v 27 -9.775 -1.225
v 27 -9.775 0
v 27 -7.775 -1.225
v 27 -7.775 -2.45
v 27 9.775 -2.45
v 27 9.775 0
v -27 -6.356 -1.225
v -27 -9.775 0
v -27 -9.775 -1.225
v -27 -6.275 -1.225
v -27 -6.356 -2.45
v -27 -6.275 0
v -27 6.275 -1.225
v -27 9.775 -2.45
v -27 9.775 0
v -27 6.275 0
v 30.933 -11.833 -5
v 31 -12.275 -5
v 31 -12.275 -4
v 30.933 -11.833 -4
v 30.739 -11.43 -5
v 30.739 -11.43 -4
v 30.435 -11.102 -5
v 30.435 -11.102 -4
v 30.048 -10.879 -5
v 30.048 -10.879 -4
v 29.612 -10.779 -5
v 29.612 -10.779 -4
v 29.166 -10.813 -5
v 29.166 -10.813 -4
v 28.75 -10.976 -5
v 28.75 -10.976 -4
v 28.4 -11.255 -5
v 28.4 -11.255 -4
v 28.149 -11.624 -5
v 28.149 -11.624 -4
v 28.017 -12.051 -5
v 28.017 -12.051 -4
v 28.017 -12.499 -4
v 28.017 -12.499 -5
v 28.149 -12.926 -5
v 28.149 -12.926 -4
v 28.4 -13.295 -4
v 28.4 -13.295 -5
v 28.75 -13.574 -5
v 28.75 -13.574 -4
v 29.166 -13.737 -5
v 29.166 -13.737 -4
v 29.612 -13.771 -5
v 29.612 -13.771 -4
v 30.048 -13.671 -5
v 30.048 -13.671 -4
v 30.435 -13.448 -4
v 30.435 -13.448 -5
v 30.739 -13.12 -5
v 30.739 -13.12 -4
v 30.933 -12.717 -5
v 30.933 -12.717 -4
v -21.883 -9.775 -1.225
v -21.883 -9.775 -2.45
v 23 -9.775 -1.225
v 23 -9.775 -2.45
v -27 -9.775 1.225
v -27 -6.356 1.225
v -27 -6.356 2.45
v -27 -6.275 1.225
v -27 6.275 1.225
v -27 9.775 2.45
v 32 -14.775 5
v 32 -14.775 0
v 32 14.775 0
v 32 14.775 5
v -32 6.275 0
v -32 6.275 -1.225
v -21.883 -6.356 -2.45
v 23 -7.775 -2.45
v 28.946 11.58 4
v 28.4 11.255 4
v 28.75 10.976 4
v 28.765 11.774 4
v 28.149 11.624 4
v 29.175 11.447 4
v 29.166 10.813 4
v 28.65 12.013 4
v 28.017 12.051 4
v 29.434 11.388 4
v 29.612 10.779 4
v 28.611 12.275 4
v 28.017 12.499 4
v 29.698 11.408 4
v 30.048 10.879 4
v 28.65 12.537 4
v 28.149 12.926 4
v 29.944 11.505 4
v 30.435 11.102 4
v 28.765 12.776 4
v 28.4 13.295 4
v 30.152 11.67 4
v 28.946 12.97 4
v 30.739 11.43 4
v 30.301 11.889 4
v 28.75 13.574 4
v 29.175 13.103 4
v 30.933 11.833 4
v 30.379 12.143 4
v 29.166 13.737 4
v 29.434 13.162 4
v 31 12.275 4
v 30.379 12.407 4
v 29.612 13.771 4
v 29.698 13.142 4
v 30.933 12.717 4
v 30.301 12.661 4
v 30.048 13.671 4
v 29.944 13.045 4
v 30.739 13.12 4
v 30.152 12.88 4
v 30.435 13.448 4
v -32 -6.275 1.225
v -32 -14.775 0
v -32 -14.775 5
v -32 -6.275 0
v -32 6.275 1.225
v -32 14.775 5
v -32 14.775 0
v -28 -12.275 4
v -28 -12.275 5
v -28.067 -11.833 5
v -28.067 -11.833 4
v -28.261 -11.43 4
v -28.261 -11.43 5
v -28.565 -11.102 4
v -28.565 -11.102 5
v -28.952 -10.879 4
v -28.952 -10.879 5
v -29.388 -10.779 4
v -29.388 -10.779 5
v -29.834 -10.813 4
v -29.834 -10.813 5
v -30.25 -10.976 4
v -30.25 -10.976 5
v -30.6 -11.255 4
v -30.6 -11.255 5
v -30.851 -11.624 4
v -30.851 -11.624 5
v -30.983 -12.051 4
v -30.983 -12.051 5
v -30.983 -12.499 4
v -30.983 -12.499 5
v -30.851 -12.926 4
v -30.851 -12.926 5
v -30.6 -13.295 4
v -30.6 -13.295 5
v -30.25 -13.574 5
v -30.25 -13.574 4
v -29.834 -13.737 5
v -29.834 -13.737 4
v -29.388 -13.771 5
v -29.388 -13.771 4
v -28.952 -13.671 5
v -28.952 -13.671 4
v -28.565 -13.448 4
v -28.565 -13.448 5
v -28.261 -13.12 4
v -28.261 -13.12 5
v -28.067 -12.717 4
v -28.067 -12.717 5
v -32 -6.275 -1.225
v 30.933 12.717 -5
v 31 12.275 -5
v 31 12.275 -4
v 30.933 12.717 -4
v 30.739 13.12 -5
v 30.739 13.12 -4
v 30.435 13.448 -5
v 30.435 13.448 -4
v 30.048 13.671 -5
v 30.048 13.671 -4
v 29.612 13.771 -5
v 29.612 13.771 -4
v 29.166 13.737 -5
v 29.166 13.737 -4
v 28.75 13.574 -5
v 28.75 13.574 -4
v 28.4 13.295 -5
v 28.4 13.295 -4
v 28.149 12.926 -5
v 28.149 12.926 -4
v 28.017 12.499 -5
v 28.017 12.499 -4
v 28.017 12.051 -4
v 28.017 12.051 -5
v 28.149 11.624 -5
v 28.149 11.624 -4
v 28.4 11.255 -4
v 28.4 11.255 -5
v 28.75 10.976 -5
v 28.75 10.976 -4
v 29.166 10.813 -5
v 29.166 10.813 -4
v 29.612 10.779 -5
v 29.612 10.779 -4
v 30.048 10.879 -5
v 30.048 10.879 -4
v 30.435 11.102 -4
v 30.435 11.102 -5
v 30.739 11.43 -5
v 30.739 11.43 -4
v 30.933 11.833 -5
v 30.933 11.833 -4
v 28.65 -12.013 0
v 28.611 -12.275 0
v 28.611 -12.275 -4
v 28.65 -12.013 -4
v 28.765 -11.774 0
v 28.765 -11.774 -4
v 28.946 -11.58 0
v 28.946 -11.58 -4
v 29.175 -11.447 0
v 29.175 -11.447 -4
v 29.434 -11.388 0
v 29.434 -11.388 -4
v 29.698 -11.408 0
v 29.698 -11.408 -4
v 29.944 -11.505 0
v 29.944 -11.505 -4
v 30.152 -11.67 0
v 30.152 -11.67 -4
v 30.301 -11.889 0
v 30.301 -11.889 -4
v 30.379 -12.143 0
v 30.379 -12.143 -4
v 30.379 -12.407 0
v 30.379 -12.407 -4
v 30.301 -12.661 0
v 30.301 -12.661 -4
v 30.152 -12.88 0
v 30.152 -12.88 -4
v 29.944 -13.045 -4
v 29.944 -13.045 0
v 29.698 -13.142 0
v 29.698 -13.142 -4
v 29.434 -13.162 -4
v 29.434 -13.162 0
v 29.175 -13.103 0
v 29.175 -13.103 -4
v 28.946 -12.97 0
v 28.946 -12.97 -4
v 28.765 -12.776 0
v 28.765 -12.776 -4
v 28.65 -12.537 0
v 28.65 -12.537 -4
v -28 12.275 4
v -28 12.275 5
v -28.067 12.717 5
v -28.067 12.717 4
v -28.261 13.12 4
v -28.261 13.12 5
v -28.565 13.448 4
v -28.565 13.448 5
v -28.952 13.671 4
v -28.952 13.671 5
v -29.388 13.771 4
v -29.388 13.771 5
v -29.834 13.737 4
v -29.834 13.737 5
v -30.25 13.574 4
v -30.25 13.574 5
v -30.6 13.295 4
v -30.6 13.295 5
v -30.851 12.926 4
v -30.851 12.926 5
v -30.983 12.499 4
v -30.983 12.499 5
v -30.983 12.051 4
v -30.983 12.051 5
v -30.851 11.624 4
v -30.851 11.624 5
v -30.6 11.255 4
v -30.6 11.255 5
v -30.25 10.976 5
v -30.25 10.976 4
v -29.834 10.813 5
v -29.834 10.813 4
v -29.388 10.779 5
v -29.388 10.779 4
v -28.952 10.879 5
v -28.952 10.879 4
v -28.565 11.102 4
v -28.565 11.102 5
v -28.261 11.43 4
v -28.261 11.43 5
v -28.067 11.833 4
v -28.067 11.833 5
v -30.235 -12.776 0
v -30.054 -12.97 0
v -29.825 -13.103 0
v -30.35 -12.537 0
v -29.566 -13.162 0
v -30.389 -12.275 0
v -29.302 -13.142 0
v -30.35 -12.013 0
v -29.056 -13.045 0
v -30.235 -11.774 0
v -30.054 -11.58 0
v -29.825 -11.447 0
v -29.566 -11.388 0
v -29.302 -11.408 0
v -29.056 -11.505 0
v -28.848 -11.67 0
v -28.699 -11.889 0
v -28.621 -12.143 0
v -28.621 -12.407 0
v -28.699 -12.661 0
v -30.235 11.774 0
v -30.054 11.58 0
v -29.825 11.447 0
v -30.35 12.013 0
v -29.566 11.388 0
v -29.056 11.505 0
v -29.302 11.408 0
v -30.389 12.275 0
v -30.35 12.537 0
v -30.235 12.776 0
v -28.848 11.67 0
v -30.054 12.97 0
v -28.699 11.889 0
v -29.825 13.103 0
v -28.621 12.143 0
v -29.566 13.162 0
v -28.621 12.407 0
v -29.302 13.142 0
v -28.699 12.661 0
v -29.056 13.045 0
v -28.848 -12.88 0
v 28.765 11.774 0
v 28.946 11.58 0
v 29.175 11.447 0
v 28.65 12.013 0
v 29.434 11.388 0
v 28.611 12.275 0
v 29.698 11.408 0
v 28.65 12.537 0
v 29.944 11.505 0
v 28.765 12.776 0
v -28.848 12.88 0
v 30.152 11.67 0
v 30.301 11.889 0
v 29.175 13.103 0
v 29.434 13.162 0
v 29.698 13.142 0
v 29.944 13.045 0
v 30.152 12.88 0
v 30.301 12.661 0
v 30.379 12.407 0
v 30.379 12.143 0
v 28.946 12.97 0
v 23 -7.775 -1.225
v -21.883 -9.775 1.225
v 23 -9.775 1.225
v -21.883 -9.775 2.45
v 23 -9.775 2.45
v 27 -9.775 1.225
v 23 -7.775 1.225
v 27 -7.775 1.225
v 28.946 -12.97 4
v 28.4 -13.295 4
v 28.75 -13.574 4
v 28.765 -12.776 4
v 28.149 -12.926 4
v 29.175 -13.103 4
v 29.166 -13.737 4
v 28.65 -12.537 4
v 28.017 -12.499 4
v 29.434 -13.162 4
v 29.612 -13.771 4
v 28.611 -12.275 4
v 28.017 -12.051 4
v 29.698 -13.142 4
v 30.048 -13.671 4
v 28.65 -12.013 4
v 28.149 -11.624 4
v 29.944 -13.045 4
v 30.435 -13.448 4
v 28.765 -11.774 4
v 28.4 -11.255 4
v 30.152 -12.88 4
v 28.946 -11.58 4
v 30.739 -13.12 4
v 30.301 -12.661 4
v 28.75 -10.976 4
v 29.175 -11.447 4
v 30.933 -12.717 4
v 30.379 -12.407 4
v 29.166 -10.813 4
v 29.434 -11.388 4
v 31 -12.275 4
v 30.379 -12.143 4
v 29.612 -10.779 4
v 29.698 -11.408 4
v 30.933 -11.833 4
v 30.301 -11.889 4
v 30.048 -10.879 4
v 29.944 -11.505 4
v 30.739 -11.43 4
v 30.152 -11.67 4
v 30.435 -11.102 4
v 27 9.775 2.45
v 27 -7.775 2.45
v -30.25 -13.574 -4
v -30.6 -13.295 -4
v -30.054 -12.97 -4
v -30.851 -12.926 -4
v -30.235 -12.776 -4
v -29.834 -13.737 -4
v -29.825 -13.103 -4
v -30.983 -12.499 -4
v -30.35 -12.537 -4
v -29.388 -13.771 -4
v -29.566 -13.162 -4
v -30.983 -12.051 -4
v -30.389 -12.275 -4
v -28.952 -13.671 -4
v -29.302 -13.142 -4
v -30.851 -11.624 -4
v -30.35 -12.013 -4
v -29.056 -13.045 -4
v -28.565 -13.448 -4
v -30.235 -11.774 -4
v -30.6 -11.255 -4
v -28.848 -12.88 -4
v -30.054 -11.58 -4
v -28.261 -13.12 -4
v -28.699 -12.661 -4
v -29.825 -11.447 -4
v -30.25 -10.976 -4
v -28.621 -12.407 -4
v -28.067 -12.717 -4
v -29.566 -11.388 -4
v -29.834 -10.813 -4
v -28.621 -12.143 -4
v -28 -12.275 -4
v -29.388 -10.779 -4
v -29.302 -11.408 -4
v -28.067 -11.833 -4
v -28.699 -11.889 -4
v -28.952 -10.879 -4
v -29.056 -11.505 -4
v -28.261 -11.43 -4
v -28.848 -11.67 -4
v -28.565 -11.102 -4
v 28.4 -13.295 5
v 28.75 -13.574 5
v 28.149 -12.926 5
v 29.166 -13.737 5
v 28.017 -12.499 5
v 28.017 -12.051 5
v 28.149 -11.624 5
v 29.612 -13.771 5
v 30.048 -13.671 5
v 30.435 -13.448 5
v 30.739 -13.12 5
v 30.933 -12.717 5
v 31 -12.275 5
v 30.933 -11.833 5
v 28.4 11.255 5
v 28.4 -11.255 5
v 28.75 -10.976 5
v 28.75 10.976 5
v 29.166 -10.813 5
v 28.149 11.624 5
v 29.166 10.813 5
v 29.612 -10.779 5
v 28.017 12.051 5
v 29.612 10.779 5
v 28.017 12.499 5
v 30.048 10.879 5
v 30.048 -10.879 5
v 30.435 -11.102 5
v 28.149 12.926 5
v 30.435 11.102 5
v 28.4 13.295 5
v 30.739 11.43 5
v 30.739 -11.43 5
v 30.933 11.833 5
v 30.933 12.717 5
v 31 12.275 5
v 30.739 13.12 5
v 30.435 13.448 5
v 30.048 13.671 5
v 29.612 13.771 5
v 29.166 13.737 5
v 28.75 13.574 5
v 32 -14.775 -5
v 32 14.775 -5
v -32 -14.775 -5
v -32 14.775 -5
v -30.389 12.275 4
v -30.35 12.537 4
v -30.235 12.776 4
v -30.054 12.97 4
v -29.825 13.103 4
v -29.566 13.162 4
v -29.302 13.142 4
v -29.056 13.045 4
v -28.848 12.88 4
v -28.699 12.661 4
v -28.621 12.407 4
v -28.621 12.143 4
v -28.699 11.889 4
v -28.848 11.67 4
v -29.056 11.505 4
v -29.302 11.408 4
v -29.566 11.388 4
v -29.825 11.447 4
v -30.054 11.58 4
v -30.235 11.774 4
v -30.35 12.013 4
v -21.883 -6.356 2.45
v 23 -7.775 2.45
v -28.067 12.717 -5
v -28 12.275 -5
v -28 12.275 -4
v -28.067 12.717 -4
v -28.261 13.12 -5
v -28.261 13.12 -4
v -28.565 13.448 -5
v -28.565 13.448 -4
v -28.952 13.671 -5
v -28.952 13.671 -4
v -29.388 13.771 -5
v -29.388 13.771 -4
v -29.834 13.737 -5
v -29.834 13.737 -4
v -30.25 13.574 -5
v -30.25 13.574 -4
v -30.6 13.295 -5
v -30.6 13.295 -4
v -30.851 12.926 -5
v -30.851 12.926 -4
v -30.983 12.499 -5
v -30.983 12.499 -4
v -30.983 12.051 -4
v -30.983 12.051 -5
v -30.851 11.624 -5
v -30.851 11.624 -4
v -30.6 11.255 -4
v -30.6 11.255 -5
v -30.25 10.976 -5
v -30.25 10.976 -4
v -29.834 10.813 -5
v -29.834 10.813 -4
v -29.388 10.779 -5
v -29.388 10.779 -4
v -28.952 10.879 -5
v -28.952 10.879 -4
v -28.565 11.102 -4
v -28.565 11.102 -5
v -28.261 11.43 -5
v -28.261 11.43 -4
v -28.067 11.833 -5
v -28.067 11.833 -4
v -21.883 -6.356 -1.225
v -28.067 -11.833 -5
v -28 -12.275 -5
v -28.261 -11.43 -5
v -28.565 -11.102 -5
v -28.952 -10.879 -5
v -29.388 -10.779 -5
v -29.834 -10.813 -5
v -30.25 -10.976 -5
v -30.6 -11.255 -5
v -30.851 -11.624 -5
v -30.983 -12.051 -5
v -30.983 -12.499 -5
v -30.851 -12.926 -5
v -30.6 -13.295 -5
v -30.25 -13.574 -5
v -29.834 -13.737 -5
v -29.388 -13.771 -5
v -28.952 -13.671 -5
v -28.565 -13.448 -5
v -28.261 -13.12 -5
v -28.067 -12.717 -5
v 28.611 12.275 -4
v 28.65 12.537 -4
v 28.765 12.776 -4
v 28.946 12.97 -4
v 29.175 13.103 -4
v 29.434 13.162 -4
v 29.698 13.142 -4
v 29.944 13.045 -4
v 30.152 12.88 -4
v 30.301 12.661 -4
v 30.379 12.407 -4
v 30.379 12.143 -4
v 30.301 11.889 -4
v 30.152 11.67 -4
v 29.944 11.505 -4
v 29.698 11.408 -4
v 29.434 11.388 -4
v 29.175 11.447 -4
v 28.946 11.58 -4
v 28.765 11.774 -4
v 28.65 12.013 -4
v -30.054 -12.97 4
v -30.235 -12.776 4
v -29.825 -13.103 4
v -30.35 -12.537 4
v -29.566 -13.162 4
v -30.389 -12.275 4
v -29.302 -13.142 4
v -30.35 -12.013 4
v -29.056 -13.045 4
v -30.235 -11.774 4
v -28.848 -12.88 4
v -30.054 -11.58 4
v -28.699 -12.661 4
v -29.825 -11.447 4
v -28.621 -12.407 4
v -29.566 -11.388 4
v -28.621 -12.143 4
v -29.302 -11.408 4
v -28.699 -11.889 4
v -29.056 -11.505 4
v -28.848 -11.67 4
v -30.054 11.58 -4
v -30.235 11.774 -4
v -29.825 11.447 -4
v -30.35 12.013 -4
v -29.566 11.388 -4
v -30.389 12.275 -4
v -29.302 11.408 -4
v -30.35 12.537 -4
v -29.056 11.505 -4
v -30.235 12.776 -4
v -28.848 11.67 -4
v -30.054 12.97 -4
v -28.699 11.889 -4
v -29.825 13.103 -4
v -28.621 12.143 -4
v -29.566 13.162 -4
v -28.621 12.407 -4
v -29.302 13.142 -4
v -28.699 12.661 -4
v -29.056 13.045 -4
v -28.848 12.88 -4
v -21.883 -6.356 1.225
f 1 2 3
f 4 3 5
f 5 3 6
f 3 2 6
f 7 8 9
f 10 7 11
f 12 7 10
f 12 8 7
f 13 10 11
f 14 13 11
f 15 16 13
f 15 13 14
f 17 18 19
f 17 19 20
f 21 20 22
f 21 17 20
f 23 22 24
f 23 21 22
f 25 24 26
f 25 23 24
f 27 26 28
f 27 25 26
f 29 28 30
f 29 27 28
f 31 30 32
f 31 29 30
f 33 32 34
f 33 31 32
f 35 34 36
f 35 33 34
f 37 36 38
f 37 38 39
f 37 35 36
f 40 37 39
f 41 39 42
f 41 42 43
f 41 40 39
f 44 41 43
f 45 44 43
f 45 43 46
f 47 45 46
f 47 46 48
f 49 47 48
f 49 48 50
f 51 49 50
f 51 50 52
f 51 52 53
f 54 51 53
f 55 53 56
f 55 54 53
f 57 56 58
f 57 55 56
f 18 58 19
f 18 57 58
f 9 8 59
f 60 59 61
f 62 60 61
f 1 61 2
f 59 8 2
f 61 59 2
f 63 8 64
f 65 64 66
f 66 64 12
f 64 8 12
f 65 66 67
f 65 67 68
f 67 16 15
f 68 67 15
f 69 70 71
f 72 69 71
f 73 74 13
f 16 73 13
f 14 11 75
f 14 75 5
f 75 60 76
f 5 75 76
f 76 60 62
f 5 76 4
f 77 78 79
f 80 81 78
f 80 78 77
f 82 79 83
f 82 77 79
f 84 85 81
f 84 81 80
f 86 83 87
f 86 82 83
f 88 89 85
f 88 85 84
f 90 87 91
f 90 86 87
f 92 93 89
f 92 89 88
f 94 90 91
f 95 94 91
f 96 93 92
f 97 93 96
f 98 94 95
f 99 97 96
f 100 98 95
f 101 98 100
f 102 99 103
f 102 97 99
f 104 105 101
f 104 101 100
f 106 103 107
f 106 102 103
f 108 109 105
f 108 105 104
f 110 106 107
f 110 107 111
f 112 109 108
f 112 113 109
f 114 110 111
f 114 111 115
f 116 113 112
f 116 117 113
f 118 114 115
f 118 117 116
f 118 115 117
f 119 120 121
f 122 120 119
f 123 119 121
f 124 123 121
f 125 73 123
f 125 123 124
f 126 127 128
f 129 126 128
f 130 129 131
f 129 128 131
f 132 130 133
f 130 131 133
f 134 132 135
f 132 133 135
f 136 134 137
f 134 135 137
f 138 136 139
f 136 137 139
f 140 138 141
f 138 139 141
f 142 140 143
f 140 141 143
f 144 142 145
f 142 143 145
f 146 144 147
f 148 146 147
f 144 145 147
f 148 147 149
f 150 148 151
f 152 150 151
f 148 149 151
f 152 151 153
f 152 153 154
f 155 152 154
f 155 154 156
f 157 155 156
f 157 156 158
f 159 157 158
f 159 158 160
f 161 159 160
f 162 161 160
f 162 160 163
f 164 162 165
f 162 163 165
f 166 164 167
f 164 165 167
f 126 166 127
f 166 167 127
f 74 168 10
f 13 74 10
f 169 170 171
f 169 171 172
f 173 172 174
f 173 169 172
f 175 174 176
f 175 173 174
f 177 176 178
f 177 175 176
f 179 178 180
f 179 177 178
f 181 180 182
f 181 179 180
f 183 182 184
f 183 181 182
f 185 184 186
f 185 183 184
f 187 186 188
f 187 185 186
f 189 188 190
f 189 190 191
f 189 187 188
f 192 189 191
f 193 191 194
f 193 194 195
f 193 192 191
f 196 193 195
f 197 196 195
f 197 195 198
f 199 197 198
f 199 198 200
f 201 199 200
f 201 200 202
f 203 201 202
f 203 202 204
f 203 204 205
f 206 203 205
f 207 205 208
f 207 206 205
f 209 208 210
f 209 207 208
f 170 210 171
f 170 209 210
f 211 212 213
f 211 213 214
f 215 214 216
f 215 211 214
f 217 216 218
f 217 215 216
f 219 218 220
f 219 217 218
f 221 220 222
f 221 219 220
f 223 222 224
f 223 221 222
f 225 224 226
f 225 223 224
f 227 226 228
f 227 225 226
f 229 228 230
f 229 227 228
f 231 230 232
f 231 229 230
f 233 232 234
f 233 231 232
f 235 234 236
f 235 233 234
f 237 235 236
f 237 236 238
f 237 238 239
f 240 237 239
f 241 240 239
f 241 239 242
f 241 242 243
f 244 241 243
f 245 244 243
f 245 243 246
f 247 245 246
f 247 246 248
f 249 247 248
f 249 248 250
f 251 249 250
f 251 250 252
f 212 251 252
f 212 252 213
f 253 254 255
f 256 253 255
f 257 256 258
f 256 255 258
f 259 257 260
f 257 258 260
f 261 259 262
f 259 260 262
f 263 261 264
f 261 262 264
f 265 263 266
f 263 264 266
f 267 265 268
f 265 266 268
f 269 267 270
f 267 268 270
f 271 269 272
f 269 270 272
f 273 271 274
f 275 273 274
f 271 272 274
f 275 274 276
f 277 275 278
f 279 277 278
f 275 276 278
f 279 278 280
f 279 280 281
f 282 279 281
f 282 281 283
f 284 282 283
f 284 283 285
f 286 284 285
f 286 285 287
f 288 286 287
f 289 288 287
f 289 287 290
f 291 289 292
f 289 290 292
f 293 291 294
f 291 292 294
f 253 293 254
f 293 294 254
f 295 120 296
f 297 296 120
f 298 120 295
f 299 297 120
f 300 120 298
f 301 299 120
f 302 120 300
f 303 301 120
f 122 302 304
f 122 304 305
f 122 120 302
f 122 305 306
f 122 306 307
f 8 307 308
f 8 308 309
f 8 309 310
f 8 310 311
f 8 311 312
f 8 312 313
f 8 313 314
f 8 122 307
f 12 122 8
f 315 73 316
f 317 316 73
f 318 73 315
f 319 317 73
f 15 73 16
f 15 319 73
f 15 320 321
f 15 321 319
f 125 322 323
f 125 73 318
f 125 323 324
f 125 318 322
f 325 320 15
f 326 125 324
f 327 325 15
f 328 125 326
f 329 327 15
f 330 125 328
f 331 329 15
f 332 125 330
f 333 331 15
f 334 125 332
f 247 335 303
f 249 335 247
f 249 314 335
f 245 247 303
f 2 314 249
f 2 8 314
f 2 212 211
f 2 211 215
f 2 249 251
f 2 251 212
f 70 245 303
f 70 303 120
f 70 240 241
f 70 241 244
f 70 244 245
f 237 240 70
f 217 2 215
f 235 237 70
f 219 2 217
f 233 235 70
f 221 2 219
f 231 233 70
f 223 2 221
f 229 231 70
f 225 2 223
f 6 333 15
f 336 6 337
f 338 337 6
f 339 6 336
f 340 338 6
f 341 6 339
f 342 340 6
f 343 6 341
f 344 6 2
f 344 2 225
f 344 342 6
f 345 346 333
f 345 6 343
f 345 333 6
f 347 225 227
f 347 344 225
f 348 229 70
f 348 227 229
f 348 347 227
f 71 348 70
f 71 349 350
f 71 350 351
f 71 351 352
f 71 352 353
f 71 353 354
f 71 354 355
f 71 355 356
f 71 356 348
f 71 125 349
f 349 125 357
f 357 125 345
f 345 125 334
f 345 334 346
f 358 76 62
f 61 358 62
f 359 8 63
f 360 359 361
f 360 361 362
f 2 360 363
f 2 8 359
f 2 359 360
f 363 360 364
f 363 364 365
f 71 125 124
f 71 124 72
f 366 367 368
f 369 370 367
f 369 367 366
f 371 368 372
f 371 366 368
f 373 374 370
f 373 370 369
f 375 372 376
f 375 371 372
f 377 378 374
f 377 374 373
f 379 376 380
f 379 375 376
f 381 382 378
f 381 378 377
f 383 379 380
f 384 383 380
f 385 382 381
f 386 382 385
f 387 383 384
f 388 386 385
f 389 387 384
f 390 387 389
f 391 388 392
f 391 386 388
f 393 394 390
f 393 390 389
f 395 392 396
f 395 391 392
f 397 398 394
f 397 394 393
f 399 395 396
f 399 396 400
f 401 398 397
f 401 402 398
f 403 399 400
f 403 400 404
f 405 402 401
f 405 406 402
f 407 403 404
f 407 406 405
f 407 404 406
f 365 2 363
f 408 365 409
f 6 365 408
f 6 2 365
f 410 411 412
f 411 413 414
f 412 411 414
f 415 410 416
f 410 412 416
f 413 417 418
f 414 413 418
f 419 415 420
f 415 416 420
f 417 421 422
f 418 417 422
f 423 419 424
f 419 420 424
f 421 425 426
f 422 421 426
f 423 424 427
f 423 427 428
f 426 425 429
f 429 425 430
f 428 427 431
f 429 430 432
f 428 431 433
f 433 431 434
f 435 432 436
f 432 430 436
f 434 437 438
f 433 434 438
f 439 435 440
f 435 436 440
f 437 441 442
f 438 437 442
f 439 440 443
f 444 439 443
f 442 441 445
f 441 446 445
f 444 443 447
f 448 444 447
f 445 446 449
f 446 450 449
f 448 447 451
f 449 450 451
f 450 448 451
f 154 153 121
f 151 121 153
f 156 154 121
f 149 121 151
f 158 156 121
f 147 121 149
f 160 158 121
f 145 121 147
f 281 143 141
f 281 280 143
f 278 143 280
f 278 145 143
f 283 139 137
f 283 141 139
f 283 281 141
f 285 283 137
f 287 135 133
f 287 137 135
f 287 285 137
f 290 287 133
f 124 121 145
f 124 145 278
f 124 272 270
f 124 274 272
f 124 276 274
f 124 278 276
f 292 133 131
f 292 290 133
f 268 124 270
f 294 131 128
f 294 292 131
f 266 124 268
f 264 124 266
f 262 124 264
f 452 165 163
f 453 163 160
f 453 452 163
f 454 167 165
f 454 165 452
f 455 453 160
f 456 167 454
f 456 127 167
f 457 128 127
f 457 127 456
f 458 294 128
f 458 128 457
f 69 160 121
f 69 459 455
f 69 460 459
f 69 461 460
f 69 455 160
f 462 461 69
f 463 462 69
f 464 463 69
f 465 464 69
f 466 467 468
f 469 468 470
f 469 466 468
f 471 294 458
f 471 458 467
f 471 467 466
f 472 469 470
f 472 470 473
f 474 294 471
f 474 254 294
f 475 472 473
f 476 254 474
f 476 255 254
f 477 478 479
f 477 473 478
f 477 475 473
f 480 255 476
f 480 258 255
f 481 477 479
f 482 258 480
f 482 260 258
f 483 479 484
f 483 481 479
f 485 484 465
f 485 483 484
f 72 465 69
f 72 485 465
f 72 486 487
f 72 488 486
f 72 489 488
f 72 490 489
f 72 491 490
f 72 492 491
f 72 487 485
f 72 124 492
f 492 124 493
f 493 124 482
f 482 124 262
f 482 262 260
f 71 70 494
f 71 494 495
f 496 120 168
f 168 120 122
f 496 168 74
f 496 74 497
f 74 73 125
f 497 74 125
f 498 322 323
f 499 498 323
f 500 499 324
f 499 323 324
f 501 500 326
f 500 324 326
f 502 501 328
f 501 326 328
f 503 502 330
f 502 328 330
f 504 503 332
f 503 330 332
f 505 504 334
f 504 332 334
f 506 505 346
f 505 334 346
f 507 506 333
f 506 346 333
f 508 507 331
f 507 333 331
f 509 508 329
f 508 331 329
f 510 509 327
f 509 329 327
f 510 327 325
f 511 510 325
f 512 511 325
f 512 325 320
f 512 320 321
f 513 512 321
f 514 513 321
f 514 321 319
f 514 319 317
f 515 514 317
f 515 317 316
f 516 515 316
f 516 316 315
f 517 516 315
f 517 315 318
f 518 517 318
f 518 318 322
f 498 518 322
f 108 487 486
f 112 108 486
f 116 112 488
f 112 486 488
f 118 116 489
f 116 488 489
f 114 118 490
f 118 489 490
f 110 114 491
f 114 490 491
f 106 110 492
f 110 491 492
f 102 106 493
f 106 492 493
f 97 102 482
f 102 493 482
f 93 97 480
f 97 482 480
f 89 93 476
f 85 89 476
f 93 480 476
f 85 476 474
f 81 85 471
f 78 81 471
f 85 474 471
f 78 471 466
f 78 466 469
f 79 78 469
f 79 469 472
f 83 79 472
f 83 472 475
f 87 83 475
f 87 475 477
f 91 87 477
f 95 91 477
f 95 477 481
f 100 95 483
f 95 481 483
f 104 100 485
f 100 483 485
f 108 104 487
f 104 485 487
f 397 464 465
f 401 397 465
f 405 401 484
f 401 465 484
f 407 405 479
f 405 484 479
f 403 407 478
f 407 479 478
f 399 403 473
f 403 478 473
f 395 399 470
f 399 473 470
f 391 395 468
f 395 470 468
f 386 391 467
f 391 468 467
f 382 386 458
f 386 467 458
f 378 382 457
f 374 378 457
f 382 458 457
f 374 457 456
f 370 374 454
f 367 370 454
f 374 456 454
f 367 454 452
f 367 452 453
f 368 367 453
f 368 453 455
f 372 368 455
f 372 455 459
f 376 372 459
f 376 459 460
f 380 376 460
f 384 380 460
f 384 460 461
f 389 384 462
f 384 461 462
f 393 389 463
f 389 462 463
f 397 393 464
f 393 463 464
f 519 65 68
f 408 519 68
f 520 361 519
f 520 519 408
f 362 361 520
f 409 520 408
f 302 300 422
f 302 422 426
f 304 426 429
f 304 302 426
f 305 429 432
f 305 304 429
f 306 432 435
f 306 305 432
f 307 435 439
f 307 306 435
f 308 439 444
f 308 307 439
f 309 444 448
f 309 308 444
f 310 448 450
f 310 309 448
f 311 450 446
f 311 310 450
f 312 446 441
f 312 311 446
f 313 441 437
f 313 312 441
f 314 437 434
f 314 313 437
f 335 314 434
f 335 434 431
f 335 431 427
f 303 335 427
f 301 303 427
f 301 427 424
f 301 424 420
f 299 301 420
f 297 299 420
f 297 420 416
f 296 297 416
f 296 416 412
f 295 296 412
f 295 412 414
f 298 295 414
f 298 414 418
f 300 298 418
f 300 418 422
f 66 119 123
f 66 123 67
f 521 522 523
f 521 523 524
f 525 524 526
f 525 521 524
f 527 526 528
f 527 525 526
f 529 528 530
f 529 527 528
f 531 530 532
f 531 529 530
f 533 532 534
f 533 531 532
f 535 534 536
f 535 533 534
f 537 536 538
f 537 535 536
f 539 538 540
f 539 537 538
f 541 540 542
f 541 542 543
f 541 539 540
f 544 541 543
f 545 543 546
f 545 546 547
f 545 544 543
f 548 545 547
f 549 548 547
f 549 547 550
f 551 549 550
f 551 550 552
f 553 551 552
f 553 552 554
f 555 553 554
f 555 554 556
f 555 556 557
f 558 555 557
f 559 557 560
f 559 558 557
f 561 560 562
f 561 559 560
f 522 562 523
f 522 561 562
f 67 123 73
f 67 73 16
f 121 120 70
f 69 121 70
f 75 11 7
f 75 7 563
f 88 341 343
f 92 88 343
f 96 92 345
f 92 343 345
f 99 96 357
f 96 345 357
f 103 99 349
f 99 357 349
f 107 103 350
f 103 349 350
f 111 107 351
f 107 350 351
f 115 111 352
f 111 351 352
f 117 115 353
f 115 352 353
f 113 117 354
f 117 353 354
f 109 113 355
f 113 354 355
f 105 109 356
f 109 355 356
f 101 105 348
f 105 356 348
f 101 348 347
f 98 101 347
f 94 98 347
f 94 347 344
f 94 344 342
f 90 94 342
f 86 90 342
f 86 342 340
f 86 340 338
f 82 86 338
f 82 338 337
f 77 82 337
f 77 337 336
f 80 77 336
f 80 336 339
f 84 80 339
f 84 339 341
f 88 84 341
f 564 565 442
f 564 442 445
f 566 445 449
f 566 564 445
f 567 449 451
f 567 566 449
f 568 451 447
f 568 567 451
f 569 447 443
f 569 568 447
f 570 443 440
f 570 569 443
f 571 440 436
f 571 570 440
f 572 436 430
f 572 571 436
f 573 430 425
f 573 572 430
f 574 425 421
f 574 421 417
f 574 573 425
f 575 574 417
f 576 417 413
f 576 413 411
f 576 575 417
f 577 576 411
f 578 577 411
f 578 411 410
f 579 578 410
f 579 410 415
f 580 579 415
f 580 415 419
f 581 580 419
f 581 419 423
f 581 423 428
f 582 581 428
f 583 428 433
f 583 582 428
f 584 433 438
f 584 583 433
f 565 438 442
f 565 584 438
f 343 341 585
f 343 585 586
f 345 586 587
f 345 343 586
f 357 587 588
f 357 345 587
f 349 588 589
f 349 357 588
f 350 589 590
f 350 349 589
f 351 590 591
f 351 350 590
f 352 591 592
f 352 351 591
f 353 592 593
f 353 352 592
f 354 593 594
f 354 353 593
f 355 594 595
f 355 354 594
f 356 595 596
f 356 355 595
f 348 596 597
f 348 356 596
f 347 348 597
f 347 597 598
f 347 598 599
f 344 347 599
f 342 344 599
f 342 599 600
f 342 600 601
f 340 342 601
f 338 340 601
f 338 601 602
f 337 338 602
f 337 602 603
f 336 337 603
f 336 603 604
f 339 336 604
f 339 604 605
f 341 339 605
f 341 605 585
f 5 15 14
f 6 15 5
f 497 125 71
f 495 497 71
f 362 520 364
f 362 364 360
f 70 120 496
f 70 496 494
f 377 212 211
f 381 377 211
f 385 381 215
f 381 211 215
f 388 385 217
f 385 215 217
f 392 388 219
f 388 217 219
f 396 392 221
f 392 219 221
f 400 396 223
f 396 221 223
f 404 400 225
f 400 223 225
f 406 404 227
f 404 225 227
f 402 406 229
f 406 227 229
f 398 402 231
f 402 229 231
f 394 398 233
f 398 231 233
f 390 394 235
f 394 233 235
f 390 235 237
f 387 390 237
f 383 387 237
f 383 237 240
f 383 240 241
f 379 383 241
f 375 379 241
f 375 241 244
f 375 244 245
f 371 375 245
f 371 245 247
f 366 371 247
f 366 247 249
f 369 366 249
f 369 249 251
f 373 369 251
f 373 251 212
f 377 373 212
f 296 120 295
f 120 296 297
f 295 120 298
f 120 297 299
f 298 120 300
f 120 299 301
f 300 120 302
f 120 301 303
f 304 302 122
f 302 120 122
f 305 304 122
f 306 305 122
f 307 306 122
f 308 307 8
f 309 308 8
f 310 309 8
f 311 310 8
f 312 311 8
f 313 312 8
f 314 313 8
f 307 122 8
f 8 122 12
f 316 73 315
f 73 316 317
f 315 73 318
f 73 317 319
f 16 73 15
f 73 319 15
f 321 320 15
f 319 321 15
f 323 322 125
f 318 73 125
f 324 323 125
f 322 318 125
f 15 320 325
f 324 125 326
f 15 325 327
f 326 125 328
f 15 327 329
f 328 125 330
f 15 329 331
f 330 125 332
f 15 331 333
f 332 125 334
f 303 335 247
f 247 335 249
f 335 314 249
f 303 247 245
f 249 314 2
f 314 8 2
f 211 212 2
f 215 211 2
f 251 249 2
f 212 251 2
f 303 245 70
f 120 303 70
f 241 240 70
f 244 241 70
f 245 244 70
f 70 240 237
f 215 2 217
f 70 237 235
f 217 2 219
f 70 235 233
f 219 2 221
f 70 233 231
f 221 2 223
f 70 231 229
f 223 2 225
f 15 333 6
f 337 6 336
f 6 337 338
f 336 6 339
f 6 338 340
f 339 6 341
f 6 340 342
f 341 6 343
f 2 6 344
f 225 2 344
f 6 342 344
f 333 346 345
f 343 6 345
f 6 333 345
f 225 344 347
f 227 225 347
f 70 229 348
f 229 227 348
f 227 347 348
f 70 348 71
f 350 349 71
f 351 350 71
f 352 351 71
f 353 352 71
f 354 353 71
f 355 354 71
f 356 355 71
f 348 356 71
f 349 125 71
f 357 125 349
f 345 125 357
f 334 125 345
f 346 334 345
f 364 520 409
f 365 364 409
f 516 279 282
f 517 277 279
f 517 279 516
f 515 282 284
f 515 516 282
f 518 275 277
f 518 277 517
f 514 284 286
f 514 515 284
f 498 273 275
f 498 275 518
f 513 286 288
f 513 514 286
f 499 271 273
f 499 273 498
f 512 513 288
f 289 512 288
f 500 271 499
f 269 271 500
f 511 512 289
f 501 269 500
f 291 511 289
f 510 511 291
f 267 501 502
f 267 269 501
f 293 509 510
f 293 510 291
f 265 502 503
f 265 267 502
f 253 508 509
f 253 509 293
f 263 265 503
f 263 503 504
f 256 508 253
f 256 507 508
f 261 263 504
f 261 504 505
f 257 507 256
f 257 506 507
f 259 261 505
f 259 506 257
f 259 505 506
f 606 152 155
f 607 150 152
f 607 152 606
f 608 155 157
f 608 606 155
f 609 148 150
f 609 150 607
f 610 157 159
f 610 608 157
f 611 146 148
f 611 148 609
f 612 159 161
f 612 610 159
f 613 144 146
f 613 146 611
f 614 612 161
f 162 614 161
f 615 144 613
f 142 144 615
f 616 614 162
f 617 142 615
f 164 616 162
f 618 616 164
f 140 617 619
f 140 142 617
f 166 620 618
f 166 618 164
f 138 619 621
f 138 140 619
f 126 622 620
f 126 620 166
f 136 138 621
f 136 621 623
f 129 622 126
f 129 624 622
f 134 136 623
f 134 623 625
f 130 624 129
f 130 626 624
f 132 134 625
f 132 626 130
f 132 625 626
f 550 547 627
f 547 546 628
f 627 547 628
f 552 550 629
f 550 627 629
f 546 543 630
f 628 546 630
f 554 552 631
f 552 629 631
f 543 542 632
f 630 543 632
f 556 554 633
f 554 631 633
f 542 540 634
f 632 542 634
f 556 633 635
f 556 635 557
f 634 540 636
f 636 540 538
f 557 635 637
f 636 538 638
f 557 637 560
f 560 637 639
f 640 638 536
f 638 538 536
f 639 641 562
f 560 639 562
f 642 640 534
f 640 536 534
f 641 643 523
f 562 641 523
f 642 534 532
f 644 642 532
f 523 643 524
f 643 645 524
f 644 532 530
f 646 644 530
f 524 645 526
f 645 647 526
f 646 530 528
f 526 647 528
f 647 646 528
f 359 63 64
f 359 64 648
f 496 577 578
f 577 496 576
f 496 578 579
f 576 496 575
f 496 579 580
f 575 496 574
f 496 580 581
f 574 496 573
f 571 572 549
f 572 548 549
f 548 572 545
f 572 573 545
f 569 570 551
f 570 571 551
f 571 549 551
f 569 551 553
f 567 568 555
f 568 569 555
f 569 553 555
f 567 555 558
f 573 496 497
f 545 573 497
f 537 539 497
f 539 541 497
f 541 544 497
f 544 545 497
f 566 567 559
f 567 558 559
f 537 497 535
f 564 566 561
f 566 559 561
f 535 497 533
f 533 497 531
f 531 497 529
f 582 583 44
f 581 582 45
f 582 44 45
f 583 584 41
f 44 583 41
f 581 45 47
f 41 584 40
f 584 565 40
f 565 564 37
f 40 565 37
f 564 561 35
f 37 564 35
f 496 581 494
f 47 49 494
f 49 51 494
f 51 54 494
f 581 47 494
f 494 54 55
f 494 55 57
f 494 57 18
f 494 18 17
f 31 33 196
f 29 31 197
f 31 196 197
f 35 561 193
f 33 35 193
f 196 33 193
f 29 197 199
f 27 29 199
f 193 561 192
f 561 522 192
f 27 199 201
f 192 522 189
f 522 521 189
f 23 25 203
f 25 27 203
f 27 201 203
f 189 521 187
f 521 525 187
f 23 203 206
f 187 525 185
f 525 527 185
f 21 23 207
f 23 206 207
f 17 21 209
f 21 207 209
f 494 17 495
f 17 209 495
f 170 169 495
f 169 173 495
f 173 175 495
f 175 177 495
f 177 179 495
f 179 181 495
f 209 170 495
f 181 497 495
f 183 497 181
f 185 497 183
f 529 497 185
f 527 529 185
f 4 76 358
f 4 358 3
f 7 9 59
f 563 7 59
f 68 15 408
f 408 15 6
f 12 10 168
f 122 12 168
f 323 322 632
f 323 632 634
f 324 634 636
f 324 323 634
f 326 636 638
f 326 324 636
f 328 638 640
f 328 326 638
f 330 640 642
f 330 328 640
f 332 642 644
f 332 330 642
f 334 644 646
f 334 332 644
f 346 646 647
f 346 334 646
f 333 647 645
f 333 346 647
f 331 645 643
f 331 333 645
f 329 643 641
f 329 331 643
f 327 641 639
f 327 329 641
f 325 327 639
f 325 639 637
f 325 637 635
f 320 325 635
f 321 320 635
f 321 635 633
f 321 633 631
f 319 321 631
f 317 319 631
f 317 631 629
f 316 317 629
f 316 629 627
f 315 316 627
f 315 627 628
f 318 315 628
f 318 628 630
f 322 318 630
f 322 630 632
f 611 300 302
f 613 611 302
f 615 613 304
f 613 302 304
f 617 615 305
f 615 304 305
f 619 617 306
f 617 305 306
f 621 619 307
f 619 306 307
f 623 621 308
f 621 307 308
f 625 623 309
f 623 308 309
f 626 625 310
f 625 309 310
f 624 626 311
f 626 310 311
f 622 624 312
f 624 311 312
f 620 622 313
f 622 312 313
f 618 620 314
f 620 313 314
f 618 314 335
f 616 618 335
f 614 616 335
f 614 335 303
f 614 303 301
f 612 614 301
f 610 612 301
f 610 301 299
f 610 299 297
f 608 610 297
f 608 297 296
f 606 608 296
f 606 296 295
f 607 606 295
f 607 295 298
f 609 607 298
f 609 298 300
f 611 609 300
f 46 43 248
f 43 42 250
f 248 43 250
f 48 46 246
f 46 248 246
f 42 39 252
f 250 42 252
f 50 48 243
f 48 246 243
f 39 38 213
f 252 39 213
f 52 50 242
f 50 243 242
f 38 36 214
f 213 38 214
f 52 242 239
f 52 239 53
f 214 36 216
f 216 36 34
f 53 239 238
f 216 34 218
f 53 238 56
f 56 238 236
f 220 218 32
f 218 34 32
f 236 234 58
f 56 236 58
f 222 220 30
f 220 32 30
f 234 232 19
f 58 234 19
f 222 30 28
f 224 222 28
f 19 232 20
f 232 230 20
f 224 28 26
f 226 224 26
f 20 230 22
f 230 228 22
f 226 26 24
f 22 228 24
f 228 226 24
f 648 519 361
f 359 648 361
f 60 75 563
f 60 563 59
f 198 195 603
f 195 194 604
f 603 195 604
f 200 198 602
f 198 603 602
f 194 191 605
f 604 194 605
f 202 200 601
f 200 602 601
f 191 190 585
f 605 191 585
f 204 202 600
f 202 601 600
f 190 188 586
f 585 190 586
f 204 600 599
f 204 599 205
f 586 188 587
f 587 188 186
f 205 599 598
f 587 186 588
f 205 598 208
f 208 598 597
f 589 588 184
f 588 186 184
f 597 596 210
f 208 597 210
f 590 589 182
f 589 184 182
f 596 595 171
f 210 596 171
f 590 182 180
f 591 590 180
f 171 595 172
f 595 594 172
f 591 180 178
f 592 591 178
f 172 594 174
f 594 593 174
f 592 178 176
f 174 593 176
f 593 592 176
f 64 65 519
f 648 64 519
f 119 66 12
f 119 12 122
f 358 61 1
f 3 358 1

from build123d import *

# Parameters (mm, degrees)
F1_W      = 64
F1_H      = 29.55
F2_DEPTH  = 5
F0_W      = 54
F0_H      = 19.55
F3_DEPTH  = 2.45
F5_DEPTH  = 2.451
F6_R      = 1.5
F7_DEPTH  = 1
F8_D      = 1.778
F9_W      = 5.1171027571
F9_H      = 3.4193800107
F9_W_2    = 5
F9_H_2    = 12.55
F9_W_3    = 4
F9_H_3    = 2
F10_DEPTH = 1.225


with BuildPart() as f2:
    # F1 (on Top) → F2 (new body)
    with BuildSketch(Plane.XY):
        Rectangle(F1_W, F1_H)
    extrude(amount=F2_DEPTH)

    # F0 (on Top) → F3 (cut, through all)
    with BuildSketch(Plane.XY):
        Rectangle(F0_W, F0_H)
    extrude(amount=F3_DEPTH, mode=Mode.SUBTRACT)

    # F4 (on face) → F5 (cut, through all)
    with BuildSketch(Plane(origin=(0, 0, 2.45), x_dir=(1, 0, 0), z_dir=(0, 0, -1))):
        Polygon((-27, 6.275), (-32, 6.275), (-32, 0), (-32, -6.275), (-27, -6.275), align=None)
    extrude(amount=F5_DEPTH, mode=Mode.SUBTRACT)

    # F6 (on face) → F7 (cut)
    with BuildSketch(Plane.XY.offset(5)):
        with Locations((-29.5, -12.275)):
            Circle(F6_R)
        with Locations((-29.5, 12.275)):
            Circle(F6_R)
        with Locations((29.5, 12.275)):
            Circle(F6_R)
        with Locations((29.5, -12.275)):
            Circle(F6_R)
    extrude(amount=-F7_DEPTH, mode=Mode.SUBTRACT)

    # F8 (through all)
    with Locations(Plane.XY.offset(5)):
        with Locations((-29.5, 12.275), (-29.5, -12.275), (29.5, 12.275), (29.5, -12.275)):
            Hole(F8_D / 2)

    # F9 (on face) → F10 (join, through all)
    with BuildSketch(Plane(origin=(0, 0, 2.45), x_dir=(1, 0, 0), z_dir=(0, 0, -1))):
        with Locations((-24.4414486215, 8.0653099947)):
            Rectangle(F9_W, F9_H)
        with Locations((-29.5, 0)):
            Rectangle(F9_W_2, F9_H_2)
        with Locations((25, 8.775)):
            Rectangle(F9_W_3, F9_H_3)
    extrude(amount=F10_DEPTH)


with BuildPart() as f11_1:
    # F11: instance of F2
    add(f2.part.mirror(Plane.XY))


solid = Compound([f2.part, f11_1.part])
